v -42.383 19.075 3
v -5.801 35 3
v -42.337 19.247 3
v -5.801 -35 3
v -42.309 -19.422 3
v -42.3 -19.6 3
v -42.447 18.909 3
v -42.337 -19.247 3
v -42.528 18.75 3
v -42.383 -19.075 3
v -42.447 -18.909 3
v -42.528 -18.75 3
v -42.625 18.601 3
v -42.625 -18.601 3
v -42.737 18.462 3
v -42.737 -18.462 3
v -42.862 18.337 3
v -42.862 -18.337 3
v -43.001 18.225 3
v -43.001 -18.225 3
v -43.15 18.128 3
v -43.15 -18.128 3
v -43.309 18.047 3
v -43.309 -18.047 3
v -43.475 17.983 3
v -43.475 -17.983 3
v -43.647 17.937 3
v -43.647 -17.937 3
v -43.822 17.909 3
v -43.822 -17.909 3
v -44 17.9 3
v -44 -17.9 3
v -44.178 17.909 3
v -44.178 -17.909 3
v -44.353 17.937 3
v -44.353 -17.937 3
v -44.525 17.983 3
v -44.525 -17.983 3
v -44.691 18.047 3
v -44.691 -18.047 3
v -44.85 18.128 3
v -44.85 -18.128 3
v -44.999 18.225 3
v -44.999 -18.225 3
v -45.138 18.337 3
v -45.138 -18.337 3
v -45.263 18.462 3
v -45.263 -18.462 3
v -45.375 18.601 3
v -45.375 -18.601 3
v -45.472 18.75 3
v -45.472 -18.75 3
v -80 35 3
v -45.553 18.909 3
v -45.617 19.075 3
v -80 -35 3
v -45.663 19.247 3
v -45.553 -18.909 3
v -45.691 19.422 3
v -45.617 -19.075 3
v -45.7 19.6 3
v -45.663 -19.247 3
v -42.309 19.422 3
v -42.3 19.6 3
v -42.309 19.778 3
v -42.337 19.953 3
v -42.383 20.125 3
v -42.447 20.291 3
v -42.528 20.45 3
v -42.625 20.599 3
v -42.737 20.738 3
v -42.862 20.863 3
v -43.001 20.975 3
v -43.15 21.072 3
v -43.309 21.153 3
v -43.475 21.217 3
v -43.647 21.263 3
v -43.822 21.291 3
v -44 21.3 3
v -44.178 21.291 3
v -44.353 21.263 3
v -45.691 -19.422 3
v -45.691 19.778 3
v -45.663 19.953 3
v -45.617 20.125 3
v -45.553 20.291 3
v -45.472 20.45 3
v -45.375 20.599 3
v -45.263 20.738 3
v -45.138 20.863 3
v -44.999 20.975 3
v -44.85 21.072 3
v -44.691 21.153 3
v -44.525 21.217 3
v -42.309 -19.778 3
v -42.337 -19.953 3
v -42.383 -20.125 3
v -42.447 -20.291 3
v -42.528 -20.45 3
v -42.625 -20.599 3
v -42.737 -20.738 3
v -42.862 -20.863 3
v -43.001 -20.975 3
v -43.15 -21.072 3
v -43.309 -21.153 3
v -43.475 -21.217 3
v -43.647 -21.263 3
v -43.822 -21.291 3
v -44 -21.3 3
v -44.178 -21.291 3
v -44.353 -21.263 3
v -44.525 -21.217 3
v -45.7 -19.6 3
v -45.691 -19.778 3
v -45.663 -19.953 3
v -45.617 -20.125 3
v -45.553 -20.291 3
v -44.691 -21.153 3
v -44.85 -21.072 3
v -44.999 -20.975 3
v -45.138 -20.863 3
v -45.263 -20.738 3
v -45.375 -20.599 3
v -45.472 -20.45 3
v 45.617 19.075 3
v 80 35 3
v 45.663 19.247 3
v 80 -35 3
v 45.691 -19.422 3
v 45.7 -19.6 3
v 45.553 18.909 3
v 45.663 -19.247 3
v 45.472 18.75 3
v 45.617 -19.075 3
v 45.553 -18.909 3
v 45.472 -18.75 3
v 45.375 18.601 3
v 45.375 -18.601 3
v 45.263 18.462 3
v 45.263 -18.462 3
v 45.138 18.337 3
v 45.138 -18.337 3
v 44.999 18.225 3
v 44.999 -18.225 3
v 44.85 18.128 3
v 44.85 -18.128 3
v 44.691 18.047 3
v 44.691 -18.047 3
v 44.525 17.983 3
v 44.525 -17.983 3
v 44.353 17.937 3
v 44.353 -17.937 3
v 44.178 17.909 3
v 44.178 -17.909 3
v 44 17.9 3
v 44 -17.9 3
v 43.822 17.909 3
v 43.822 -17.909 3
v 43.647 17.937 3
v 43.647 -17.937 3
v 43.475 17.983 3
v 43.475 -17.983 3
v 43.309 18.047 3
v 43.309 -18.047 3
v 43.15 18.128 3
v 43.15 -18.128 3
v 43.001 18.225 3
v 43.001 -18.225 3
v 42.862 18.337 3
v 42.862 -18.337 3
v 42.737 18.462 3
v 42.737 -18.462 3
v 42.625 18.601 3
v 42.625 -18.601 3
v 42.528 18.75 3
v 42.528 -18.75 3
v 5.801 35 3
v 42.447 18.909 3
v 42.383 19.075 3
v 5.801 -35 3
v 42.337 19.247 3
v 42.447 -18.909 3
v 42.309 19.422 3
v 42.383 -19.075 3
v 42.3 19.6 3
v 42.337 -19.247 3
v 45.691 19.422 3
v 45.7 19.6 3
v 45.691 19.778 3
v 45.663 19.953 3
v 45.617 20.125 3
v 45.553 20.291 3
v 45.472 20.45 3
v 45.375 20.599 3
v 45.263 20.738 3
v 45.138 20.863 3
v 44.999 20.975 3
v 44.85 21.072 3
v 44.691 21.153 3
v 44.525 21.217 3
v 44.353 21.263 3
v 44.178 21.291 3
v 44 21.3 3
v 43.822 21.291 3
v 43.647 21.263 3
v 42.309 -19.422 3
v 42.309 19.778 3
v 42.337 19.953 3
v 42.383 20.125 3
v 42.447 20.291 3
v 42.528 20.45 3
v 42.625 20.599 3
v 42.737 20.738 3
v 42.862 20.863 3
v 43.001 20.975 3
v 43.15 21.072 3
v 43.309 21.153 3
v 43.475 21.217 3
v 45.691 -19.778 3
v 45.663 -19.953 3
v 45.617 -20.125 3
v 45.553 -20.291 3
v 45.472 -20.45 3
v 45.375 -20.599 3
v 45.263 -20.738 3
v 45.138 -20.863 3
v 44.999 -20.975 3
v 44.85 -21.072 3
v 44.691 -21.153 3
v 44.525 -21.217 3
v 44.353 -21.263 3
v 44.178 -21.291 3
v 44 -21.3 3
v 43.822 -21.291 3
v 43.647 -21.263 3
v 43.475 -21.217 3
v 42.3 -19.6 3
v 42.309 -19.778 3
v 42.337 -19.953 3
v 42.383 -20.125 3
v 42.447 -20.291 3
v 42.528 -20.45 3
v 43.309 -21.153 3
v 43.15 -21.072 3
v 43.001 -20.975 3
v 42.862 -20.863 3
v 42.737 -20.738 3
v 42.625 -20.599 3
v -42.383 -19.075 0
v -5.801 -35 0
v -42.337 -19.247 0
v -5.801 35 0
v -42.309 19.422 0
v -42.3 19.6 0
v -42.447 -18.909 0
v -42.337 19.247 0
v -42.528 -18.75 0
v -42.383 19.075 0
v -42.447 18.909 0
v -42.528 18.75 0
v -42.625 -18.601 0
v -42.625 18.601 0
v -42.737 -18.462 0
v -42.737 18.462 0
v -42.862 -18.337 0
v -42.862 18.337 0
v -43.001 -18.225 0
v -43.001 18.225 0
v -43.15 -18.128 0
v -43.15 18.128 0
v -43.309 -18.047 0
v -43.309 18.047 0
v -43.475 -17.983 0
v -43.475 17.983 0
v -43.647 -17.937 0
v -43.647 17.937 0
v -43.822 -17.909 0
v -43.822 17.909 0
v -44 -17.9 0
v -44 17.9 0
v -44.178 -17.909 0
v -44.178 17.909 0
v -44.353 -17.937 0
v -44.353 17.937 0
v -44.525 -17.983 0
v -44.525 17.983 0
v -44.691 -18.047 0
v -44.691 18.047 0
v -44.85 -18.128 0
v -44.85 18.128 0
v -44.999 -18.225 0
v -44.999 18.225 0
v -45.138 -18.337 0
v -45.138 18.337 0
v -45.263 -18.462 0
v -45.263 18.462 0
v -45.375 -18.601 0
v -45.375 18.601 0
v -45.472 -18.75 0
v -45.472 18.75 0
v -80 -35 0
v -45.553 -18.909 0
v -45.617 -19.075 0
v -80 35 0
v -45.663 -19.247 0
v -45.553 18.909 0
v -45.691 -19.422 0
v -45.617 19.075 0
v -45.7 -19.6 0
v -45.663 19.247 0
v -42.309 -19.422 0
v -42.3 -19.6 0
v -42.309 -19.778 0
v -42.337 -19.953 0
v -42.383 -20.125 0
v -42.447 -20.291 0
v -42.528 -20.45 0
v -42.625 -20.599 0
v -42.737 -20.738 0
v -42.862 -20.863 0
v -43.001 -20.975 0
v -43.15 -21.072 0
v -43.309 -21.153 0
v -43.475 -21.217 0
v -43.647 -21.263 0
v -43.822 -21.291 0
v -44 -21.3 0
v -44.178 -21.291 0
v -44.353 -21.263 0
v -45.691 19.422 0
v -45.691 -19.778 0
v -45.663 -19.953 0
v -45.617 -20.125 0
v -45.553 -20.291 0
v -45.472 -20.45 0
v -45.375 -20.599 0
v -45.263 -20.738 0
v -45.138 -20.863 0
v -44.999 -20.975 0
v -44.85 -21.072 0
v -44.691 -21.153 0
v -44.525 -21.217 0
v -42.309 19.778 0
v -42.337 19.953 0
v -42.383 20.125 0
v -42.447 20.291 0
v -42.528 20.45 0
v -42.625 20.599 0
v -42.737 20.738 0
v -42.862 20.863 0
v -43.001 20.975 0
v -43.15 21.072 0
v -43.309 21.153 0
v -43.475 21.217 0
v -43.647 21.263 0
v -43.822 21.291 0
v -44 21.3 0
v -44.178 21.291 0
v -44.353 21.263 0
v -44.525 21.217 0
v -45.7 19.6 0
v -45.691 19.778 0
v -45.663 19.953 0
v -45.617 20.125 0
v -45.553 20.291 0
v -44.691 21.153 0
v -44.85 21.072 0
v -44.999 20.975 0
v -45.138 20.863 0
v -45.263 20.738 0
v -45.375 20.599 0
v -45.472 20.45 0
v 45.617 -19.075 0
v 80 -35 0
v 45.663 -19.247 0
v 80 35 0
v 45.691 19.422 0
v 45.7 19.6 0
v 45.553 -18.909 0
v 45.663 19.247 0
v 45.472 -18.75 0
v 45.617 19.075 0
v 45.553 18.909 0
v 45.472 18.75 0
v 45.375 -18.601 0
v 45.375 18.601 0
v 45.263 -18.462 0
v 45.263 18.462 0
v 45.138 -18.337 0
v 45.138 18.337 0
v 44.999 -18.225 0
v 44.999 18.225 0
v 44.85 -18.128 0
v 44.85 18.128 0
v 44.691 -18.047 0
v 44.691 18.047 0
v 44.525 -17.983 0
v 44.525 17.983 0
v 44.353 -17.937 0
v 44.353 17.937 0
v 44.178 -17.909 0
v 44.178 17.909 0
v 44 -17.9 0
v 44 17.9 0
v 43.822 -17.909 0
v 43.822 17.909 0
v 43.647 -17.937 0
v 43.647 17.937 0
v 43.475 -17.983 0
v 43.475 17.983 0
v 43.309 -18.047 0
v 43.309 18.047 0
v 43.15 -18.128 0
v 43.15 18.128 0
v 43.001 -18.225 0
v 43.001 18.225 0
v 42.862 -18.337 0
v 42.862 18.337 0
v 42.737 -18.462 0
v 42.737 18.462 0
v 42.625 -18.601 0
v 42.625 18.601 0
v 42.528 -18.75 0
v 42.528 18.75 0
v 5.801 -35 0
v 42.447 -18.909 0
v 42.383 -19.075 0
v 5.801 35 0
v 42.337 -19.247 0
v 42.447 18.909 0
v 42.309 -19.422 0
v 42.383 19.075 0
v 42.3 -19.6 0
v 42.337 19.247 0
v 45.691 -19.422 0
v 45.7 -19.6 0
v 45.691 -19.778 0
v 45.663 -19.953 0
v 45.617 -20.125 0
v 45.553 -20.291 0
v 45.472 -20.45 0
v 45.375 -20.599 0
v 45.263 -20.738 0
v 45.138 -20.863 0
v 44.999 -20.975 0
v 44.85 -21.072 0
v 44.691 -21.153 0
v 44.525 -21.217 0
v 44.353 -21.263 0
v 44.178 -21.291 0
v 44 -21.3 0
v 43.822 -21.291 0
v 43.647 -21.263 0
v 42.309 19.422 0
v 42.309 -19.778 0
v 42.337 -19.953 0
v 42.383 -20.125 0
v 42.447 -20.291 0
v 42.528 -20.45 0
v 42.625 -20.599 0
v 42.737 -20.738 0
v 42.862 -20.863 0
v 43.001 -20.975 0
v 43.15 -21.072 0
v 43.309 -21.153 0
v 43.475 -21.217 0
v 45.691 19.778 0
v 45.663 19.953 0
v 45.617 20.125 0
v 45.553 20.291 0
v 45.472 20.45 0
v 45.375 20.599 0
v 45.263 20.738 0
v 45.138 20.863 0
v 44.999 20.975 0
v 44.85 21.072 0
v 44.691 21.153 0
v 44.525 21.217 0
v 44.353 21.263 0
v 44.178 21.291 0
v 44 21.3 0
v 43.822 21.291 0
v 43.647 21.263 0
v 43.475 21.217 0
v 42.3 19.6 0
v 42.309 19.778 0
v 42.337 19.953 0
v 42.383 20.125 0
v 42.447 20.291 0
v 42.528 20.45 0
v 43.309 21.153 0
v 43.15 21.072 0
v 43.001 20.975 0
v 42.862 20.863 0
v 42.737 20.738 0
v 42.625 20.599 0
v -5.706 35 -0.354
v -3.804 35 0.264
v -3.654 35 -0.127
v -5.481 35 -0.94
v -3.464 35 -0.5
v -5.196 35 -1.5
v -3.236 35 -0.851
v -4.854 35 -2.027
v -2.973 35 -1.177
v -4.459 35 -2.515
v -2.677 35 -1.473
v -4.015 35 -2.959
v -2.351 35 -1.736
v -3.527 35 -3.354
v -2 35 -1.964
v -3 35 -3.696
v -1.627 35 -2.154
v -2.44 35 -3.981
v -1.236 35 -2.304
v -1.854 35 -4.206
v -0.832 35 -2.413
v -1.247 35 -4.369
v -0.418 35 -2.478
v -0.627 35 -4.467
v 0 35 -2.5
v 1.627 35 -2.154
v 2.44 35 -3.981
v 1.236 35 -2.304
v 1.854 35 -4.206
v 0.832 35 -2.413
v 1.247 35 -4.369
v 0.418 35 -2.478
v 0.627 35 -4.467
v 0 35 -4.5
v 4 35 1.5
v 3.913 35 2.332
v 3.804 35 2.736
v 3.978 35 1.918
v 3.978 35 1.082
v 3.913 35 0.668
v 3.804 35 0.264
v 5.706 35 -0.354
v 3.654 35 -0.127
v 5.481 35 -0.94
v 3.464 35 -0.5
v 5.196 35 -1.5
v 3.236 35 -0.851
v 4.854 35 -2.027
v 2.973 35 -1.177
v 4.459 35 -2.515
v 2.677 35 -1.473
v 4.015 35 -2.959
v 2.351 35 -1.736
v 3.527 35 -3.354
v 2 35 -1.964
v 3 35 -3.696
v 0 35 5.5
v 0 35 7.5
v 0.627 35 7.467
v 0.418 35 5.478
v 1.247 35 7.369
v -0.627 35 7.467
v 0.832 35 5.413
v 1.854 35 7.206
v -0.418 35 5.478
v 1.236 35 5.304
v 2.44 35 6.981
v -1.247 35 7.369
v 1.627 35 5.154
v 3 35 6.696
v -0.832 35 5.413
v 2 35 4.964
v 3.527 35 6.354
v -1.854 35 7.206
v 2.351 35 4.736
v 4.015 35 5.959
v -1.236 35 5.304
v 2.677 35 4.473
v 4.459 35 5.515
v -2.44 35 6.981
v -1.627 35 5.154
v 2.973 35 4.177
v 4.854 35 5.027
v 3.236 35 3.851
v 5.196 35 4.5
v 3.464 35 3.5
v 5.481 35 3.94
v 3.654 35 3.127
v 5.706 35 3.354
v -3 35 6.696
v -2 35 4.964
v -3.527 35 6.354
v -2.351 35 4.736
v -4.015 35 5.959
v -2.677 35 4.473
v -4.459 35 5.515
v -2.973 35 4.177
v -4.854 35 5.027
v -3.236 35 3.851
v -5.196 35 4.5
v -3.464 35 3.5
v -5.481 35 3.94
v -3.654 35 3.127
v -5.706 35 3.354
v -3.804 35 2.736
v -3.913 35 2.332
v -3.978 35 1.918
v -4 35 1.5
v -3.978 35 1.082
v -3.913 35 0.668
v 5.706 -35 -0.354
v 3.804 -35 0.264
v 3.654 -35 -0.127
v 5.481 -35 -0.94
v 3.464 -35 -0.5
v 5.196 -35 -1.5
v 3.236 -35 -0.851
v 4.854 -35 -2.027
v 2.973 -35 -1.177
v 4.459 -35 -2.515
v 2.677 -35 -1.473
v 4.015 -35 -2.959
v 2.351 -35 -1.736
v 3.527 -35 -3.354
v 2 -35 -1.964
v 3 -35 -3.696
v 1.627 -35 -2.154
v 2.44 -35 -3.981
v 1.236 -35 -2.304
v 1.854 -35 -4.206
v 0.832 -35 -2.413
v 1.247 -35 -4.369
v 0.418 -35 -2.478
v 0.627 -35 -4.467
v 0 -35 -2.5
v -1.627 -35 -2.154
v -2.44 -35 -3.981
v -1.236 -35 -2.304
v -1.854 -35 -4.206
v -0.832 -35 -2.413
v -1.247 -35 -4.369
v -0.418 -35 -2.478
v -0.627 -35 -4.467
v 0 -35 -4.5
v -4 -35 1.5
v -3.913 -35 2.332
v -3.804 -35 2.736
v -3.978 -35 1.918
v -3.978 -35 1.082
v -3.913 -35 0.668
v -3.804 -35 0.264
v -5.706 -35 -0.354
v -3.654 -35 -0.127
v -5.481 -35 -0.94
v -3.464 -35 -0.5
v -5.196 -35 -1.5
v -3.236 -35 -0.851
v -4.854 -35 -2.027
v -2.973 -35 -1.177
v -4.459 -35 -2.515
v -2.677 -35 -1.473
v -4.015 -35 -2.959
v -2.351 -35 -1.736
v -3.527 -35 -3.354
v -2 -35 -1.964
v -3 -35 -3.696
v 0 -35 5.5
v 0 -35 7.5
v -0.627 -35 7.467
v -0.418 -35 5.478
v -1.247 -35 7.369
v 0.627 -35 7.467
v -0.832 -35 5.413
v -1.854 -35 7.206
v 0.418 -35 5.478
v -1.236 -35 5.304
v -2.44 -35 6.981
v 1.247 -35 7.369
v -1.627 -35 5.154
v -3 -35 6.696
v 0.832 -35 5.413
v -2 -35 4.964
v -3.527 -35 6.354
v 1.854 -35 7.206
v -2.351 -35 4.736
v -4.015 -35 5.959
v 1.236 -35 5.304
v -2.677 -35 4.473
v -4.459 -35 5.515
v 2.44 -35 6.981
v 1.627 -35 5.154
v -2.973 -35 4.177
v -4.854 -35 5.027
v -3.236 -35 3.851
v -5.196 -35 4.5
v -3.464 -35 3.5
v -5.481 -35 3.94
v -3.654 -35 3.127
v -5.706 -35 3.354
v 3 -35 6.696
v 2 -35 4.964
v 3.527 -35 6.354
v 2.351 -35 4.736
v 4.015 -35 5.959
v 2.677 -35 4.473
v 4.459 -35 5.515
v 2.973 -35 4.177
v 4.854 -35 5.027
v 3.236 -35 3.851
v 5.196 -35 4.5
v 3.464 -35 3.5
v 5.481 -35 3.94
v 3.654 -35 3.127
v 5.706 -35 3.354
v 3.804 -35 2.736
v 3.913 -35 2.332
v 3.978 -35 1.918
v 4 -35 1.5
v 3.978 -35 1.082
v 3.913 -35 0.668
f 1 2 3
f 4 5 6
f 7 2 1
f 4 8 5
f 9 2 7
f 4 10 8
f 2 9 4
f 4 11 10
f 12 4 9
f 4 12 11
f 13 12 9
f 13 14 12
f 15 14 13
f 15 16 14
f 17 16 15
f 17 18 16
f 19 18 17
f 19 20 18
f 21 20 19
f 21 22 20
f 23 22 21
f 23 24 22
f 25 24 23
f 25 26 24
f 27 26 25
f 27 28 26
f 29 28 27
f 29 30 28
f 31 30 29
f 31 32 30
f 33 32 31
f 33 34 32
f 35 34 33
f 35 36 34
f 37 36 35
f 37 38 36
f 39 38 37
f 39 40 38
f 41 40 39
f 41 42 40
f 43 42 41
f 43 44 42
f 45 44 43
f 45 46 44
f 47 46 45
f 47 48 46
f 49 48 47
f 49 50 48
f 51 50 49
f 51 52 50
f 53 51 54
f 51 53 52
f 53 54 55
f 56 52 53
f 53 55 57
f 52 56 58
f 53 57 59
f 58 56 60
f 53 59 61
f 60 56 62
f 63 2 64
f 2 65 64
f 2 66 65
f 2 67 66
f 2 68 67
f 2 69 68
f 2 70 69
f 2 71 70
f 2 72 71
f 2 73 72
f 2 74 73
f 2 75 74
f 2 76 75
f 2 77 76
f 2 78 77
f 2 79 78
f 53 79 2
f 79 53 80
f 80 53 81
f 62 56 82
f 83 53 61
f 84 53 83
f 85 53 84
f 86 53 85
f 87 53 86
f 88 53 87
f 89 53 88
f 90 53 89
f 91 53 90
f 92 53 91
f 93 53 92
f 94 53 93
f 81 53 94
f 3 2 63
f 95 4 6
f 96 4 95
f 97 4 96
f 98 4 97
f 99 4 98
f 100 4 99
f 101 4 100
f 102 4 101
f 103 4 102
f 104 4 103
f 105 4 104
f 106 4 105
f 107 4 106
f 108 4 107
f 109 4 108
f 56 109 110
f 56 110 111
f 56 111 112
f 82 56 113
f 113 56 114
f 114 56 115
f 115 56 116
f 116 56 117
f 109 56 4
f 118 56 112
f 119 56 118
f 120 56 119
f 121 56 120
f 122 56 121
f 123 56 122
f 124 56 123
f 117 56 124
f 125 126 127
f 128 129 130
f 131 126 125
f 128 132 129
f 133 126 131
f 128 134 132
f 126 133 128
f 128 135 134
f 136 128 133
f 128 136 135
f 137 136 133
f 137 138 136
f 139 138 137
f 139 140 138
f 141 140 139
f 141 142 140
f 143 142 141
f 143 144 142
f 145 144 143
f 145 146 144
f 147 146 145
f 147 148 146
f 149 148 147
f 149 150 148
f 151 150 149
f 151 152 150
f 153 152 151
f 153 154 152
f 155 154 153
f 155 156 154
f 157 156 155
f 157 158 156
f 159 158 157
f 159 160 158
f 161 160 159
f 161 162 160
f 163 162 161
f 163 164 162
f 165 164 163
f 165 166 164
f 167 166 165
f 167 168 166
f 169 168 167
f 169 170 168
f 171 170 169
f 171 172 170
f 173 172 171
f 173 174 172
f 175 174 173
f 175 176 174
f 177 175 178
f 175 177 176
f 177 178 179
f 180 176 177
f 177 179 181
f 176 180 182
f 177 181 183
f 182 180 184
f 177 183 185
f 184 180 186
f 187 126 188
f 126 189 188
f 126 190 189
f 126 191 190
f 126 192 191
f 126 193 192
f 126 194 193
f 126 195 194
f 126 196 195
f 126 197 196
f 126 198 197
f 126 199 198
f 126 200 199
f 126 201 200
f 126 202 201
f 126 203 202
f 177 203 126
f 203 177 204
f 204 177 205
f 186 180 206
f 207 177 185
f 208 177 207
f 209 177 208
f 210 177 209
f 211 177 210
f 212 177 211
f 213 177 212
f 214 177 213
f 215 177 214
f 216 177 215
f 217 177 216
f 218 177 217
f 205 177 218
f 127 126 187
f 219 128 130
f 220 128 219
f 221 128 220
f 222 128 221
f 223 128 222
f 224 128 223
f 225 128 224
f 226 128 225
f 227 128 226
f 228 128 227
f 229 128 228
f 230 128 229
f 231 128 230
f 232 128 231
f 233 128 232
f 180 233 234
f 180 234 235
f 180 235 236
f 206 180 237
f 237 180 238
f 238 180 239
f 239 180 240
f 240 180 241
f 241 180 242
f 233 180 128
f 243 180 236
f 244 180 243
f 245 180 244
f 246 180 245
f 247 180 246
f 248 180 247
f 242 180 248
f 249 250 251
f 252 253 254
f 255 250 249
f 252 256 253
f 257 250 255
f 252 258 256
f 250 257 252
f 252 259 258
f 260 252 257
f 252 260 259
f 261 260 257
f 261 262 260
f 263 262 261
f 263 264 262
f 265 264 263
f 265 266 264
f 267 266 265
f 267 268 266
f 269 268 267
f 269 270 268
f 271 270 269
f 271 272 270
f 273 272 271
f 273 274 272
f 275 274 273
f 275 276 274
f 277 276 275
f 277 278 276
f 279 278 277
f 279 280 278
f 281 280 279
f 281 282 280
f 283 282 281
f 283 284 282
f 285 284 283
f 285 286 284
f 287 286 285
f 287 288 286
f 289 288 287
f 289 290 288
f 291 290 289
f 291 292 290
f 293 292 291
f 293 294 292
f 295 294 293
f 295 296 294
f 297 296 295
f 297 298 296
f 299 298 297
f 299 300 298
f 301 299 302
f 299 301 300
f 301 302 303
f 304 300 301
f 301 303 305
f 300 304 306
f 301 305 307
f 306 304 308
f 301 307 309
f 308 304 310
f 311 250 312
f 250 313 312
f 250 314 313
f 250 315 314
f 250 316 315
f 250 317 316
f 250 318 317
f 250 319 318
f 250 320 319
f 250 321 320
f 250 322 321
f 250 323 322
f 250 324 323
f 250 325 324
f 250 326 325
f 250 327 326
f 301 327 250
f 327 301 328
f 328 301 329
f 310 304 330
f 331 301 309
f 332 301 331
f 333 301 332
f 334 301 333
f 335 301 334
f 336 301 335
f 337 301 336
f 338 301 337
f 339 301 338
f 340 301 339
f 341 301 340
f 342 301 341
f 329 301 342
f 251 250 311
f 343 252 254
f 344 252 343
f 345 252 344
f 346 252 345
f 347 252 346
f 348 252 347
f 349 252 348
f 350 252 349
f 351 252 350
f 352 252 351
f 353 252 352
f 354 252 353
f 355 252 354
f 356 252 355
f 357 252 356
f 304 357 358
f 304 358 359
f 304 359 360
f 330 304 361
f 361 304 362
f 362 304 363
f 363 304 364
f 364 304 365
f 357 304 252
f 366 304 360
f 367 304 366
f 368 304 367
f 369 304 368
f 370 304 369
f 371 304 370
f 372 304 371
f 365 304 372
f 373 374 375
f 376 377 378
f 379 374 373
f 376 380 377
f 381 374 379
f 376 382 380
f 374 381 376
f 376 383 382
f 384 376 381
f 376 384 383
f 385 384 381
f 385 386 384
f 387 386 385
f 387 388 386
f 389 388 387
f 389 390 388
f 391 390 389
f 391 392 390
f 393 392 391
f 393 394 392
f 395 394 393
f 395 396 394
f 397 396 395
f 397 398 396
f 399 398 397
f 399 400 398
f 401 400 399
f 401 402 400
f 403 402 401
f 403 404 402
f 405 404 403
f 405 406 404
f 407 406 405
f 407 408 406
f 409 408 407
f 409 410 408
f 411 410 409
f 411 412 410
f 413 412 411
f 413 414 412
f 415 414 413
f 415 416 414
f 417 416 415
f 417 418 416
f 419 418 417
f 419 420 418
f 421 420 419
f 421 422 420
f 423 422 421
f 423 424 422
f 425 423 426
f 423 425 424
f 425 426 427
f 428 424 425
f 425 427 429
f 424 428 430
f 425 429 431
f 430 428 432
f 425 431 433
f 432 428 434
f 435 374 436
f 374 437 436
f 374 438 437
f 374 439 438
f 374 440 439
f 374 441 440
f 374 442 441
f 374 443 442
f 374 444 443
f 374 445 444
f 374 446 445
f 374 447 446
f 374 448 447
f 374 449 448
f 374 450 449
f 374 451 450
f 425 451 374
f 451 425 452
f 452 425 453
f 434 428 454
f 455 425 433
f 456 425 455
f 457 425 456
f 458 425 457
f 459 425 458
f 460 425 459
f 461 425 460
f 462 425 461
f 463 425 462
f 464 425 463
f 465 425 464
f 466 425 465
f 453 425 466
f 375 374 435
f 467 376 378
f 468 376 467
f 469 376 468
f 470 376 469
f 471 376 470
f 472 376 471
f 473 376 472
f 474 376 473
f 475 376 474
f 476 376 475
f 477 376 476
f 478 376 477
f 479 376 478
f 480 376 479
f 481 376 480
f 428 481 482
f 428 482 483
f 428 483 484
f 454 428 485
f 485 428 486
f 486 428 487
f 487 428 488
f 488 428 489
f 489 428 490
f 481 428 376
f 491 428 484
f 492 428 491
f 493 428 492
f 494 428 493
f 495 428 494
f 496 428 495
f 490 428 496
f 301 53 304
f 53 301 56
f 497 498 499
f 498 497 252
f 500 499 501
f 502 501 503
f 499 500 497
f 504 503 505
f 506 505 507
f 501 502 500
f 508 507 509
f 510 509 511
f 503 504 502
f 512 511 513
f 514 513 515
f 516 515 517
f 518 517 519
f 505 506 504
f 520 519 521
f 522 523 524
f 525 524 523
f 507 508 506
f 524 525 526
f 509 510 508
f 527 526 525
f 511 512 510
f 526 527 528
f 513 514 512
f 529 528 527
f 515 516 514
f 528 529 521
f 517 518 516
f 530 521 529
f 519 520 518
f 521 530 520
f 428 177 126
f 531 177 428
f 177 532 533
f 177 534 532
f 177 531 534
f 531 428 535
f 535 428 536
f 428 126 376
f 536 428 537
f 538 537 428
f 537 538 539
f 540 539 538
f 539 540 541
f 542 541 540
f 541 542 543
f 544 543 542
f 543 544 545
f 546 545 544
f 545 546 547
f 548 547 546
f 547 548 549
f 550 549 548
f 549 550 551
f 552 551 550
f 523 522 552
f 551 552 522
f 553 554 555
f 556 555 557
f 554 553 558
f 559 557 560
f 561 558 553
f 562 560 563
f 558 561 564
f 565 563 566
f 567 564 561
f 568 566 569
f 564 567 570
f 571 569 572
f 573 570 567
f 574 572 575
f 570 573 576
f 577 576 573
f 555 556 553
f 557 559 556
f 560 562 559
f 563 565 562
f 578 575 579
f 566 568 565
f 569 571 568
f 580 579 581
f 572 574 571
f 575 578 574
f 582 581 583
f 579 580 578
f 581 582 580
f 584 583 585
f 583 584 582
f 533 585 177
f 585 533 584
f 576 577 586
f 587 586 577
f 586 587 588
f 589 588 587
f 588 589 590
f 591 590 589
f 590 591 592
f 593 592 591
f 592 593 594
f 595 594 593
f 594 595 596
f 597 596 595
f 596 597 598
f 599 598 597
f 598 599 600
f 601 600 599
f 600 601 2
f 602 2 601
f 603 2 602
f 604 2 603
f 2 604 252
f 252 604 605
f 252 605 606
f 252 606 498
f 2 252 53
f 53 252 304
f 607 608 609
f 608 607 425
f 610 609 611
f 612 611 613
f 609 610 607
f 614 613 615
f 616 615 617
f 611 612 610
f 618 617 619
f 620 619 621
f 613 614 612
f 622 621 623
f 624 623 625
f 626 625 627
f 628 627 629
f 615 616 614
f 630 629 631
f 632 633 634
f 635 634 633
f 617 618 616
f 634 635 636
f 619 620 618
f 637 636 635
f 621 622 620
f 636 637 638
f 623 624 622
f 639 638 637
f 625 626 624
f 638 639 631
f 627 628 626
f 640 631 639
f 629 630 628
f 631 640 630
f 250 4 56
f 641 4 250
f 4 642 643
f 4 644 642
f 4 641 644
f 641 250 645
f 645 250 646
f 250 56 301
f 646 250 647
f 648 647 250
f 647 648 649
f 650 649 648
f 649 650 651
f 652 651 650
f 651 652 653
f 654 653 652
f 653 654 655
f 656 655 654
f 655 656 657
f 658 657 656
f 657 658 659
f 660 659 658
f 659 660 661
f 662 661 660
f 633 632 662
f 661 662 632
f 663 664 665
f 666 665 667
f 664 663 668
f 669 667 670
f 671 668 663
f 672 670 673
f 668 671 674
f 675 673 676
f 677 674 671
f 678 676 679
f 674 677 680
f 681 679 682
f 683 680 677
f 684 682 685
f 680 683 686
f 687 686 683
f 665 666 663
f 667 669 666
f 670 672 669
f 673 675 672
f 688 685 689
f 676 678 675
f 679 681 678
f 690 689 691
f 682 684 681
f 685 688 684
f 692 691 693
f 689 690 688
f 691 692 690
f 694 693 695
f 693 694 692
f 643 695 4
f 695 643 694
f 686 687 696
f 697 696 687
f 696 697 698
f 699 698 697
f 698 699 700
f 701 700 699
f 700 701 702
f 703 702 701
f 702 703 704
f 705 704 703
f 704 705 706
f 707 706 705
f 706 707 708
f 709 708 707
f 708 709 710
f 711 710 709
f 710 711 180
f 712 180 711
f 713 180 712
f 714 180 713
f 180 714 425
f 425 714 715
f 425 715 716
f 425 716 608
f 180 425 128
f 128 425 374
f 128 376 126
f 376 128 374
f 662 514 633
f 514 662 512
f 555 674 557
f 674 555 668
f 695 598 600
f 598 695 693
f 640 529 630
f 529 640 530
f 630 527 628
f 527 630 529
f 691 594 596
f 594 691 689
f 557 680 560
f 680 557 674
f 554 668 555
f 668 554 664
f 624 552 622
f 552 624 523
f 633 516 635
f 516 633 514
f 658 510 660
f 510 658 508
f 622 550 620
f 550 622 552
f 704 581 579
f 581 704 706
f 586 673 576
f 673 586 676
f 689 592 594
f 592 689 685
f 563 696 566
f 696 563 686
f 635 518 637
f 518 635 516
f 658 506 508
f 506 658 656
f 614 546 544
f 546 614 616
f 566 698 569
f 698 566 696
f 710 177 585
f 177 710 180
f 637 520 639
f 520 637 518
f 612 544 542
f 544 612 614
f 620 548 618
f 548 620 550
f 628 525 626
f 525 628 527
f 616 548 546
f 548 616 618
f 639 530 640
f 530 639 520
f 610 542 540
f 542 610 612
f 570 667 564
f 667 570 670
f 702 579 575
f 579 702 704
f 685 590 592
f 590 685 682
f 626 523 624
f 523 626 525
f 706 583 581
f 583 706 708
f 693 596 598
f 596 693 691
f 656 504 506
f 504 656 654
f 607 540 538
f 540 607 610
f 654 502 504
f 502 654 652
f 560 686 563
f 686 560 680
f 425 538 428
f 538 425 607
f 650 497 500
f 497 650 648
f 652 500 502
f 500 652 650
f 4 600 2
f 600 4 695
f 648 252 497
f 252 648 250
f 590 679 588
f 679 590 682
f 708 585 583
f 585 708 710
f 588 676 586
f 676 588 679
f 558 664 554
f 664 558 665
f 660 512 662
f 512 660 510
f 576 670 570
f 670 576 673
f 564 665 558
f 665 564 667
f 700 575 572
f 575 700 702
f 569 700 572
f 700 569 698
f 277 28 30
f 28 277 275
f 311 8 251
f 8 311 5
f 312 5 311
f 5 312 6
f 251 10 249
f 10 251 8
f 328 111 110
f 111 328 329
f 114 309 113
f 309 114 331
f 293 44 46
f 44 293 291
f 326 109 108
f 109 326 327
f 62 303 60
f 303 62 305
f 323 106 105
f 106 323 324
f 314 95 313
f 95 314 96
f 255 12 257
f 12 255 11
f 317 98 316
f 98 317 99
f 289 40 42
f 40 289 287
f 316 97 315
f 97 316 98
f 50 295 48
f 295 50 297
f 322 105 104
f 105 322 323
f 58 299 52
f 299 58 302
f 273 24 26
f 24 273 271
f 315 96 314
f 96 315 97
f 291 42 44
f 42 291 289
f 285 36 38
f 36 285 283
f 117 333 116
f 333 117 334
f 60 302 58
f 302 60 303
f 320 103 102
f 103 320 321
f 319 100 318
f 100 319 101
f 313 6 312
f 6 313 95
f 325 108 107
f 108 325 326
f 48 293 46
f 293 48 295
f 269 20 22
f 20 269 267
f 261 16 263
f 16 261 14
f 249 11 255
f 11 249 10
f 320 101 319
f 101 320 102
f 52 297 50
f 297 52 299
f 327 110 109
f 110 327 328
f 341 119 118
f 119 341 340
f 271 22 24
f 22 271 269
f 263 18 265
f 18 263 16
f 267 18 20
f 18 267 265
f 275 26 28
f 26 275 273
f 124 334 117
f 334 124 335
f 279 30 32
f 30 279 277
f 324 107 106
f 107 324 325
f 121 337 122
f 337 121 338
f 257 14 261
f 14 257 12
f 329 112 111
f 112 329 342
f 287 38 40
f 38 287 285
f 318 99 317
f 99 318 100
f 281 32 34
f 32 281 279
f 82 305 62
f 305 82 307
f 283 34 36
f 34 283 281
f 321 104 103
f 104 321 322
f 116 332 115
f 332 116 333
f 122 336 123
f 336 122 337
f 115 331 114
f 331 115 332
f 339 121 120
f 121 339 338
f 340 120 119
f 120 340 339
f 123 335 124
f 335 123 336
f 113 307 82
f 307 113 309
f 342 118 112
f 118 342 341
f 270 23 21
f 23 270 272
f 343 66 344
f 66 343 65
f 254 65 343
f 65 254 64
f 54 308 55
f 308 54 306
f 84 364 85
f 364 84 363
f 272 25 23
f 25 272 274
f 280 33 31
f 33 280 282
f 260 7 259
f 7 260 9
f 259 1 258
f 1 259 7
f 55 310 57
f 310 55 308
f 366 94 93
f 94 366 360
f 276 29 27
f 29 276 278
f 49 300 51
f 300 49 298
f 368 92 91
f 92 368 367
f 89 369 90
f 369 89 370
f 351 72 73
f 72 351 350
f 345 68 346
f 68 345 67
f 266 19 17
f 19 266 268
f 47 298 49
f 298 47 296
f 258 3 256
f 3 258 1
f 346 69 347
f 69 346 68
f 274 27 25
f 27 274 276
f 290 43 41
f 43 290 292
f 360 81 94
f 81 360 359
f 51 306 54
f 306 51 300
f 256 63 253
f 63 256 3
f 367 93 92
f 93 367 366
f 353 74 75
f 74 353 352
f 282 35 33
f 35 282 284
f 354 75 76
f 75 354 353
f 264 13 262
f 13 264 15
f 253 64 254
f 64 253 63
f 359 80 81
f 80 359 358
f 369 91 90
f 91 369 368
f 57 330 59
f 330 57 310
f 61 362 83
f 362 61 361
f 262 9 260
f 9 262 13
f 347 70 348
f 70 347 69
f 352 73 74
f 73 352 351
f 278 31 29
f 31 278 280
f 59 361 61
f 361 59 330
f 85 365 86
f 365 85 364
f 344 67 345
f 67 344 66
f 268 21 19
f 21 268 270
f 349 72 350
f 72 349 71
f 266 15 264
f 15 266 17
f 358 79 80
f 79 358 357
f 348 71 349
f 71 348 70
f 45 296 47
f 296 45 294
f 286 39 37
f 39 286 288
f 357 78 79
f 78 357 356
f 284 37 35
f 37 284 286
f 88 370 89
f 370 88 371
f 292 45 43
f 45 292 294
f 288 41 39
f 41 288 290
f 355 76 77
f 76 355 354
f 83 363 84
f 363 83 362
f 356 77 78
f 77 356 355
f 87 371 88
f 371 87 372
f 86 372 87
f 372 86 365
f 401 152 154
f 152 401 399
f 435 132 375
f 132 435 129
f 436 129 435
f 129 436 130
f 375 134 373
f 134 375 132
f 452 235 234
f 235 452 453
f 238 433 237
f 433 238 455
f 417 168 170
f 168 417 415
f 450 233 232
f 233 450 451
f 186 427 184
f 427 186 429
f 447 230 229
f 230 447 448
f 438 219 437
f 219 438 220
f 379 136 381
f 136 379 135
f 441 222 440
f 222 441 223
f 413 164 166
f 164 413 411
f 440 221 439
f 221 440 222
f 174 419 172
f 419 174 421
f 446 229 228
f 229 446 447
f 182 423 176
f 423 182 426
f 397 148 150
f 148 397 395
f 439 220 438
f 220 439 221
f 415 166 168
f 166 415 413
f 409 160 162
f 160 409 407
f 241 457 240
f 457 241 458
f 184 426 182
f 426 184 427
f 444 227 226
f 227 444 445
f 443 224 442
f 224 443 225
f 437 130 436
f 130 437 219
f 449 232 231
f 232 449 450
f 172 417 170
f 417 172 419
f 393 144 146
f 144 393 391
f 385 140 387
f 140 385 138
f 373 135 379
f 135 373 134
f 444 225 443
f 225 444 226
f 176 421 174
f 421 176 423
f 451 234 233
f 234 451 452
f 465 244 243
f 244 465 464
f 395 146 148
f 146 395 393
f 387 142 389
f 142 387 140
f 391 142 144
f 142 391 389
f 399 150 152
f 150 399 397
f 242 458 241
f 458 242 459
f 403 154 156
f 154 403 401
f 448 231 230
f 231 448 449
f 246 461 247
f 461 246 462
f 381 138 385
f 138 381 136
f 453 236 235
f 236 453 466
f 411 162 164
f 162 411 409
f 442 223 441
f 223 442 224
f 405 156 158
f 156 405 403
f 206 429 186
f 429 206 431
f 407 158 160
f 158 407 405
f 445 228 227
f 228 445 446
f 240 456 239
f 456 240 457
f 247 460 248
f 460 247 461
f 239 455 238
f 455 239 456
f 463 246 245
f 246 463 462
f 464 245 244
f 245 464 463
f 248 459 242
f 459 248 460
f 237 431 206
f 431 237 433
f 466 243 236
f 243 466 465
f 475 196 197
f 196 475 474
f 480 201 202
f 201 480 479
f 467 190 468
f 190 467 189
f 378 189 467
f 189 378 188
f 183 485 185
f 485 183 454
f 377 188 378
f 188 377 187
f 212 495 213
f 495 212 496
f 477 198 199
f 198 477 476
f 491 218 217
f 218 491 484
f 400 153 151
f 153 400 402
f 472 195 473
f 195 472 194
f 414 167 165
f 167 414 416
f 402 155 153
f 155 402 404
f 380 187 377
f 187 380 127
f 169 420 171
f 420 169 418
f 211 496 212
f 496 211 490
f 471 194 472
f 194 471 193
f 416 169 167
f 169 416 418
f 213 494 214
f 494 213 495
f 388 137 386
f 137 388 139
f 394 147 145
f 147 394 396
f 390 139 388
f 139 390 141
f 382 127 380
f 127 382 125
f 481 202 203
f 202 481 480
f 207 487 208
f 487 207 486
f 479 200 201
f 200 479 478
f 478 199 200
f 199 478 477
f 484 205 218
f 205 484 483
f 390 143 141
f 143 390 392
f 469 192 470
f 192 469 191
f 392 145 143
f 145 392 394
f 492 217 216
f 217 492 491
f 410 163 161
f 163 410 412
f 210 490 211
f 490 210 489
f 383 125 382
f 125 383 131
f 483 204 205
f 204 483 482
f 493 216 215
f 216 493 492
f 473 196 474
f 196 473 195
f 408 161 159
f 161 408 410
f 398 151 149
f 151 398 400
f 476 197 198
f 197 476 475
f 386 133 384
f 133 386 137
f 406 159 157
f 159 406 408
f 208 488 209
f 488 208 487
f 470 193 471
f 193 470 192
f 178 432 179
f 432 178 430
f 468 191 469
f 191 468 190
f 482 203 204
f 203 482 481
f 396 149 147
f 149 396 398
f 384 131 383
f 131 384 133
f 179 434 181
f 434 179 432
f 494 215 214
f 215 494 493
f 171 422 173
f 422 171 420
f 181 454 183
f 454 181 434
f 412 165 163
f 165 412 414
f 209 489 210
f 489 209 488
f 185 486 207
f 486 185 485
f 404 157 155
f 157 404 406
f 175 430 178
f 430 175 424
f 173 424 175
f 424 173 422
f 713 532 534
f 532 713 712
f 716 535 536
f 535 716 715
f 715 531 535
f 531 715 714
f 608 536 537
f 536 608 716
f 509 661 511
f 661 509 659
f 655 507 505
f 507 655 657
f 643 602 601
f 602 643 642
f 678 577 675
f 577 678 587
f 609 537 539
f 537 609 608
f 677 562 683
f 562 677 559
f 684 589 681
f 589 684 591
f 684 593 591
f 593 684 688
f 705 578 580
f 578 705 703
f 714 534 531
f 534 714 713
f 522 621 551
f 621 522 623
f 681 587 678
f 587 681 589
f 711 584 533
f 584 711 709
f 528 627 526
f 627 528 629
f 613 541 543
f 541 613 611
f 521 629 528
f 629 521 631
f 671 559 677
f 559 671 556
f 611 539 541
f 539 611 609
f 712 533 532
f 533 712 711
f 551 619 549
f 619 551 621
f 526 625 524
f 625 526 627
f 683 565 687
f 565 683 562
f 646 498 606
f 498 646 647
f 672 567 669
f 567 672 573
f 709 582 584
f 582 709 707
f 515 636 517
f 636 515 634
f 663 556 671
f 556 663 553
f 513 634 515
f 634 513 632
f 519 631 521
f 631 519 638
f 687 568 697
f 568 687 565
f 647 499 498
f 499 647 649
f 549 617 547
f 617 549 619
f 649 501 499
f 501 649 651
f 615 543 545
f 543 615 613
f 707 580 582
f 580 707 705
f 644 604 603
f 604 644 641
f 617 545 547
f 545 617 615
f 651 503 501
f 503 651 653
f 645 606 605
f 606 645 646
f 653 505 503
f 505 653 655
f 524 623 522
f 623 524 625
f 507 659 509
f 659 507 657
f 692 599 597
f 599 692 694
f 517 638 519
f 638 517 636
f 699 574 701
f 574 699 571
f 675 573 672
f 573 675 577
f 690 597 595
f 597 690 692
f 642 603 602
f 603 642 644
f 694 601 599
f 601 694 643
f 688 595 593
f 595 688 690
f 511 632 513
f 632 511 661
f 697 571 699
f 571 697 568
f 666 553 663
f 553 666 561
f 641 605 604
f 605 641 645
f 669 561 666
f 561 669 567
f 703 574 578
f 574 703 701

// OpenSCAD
// Two-leaf hinge with a printable straight pin barrel.
$fn = 60;
eps = 0.02;
leaf_l = 80;
leaf_w = 70;
leaf_t = 3;
pin_d = 8;
barrel_d = pin_d + 4;
difference() {
    union() {
        translate([-leaf_l, -leaf_w / 2, 0]) cube([leaf_l, leaf_w, leaf_t]);
        translate([0, -leaf_w / 2, 0]) cube([leaf_l, leaf_w, leaf_t]);
        translate([0, -leaf_w / 2, leaf_t / 2]) rotate([-90, 0, 0]) cylinder(d = barrel_d, h = leaf_w);
    }
    translate([0, -leaf_w / 2 - eps, leaf_t / 2]) rotate([-90, 0, 0]) cylinder(d = pin_d, h = leaf_w + 2 * eps);
    for (x = [-leaf_l * 0.55, leaf_l * 0.55], y = [-leaf_w * 0.28, leaf_w * 0.28])
        translate([x, y, -eps]) cylinder(d = 3.4, h = leaf_t + 2 * eps);
}
